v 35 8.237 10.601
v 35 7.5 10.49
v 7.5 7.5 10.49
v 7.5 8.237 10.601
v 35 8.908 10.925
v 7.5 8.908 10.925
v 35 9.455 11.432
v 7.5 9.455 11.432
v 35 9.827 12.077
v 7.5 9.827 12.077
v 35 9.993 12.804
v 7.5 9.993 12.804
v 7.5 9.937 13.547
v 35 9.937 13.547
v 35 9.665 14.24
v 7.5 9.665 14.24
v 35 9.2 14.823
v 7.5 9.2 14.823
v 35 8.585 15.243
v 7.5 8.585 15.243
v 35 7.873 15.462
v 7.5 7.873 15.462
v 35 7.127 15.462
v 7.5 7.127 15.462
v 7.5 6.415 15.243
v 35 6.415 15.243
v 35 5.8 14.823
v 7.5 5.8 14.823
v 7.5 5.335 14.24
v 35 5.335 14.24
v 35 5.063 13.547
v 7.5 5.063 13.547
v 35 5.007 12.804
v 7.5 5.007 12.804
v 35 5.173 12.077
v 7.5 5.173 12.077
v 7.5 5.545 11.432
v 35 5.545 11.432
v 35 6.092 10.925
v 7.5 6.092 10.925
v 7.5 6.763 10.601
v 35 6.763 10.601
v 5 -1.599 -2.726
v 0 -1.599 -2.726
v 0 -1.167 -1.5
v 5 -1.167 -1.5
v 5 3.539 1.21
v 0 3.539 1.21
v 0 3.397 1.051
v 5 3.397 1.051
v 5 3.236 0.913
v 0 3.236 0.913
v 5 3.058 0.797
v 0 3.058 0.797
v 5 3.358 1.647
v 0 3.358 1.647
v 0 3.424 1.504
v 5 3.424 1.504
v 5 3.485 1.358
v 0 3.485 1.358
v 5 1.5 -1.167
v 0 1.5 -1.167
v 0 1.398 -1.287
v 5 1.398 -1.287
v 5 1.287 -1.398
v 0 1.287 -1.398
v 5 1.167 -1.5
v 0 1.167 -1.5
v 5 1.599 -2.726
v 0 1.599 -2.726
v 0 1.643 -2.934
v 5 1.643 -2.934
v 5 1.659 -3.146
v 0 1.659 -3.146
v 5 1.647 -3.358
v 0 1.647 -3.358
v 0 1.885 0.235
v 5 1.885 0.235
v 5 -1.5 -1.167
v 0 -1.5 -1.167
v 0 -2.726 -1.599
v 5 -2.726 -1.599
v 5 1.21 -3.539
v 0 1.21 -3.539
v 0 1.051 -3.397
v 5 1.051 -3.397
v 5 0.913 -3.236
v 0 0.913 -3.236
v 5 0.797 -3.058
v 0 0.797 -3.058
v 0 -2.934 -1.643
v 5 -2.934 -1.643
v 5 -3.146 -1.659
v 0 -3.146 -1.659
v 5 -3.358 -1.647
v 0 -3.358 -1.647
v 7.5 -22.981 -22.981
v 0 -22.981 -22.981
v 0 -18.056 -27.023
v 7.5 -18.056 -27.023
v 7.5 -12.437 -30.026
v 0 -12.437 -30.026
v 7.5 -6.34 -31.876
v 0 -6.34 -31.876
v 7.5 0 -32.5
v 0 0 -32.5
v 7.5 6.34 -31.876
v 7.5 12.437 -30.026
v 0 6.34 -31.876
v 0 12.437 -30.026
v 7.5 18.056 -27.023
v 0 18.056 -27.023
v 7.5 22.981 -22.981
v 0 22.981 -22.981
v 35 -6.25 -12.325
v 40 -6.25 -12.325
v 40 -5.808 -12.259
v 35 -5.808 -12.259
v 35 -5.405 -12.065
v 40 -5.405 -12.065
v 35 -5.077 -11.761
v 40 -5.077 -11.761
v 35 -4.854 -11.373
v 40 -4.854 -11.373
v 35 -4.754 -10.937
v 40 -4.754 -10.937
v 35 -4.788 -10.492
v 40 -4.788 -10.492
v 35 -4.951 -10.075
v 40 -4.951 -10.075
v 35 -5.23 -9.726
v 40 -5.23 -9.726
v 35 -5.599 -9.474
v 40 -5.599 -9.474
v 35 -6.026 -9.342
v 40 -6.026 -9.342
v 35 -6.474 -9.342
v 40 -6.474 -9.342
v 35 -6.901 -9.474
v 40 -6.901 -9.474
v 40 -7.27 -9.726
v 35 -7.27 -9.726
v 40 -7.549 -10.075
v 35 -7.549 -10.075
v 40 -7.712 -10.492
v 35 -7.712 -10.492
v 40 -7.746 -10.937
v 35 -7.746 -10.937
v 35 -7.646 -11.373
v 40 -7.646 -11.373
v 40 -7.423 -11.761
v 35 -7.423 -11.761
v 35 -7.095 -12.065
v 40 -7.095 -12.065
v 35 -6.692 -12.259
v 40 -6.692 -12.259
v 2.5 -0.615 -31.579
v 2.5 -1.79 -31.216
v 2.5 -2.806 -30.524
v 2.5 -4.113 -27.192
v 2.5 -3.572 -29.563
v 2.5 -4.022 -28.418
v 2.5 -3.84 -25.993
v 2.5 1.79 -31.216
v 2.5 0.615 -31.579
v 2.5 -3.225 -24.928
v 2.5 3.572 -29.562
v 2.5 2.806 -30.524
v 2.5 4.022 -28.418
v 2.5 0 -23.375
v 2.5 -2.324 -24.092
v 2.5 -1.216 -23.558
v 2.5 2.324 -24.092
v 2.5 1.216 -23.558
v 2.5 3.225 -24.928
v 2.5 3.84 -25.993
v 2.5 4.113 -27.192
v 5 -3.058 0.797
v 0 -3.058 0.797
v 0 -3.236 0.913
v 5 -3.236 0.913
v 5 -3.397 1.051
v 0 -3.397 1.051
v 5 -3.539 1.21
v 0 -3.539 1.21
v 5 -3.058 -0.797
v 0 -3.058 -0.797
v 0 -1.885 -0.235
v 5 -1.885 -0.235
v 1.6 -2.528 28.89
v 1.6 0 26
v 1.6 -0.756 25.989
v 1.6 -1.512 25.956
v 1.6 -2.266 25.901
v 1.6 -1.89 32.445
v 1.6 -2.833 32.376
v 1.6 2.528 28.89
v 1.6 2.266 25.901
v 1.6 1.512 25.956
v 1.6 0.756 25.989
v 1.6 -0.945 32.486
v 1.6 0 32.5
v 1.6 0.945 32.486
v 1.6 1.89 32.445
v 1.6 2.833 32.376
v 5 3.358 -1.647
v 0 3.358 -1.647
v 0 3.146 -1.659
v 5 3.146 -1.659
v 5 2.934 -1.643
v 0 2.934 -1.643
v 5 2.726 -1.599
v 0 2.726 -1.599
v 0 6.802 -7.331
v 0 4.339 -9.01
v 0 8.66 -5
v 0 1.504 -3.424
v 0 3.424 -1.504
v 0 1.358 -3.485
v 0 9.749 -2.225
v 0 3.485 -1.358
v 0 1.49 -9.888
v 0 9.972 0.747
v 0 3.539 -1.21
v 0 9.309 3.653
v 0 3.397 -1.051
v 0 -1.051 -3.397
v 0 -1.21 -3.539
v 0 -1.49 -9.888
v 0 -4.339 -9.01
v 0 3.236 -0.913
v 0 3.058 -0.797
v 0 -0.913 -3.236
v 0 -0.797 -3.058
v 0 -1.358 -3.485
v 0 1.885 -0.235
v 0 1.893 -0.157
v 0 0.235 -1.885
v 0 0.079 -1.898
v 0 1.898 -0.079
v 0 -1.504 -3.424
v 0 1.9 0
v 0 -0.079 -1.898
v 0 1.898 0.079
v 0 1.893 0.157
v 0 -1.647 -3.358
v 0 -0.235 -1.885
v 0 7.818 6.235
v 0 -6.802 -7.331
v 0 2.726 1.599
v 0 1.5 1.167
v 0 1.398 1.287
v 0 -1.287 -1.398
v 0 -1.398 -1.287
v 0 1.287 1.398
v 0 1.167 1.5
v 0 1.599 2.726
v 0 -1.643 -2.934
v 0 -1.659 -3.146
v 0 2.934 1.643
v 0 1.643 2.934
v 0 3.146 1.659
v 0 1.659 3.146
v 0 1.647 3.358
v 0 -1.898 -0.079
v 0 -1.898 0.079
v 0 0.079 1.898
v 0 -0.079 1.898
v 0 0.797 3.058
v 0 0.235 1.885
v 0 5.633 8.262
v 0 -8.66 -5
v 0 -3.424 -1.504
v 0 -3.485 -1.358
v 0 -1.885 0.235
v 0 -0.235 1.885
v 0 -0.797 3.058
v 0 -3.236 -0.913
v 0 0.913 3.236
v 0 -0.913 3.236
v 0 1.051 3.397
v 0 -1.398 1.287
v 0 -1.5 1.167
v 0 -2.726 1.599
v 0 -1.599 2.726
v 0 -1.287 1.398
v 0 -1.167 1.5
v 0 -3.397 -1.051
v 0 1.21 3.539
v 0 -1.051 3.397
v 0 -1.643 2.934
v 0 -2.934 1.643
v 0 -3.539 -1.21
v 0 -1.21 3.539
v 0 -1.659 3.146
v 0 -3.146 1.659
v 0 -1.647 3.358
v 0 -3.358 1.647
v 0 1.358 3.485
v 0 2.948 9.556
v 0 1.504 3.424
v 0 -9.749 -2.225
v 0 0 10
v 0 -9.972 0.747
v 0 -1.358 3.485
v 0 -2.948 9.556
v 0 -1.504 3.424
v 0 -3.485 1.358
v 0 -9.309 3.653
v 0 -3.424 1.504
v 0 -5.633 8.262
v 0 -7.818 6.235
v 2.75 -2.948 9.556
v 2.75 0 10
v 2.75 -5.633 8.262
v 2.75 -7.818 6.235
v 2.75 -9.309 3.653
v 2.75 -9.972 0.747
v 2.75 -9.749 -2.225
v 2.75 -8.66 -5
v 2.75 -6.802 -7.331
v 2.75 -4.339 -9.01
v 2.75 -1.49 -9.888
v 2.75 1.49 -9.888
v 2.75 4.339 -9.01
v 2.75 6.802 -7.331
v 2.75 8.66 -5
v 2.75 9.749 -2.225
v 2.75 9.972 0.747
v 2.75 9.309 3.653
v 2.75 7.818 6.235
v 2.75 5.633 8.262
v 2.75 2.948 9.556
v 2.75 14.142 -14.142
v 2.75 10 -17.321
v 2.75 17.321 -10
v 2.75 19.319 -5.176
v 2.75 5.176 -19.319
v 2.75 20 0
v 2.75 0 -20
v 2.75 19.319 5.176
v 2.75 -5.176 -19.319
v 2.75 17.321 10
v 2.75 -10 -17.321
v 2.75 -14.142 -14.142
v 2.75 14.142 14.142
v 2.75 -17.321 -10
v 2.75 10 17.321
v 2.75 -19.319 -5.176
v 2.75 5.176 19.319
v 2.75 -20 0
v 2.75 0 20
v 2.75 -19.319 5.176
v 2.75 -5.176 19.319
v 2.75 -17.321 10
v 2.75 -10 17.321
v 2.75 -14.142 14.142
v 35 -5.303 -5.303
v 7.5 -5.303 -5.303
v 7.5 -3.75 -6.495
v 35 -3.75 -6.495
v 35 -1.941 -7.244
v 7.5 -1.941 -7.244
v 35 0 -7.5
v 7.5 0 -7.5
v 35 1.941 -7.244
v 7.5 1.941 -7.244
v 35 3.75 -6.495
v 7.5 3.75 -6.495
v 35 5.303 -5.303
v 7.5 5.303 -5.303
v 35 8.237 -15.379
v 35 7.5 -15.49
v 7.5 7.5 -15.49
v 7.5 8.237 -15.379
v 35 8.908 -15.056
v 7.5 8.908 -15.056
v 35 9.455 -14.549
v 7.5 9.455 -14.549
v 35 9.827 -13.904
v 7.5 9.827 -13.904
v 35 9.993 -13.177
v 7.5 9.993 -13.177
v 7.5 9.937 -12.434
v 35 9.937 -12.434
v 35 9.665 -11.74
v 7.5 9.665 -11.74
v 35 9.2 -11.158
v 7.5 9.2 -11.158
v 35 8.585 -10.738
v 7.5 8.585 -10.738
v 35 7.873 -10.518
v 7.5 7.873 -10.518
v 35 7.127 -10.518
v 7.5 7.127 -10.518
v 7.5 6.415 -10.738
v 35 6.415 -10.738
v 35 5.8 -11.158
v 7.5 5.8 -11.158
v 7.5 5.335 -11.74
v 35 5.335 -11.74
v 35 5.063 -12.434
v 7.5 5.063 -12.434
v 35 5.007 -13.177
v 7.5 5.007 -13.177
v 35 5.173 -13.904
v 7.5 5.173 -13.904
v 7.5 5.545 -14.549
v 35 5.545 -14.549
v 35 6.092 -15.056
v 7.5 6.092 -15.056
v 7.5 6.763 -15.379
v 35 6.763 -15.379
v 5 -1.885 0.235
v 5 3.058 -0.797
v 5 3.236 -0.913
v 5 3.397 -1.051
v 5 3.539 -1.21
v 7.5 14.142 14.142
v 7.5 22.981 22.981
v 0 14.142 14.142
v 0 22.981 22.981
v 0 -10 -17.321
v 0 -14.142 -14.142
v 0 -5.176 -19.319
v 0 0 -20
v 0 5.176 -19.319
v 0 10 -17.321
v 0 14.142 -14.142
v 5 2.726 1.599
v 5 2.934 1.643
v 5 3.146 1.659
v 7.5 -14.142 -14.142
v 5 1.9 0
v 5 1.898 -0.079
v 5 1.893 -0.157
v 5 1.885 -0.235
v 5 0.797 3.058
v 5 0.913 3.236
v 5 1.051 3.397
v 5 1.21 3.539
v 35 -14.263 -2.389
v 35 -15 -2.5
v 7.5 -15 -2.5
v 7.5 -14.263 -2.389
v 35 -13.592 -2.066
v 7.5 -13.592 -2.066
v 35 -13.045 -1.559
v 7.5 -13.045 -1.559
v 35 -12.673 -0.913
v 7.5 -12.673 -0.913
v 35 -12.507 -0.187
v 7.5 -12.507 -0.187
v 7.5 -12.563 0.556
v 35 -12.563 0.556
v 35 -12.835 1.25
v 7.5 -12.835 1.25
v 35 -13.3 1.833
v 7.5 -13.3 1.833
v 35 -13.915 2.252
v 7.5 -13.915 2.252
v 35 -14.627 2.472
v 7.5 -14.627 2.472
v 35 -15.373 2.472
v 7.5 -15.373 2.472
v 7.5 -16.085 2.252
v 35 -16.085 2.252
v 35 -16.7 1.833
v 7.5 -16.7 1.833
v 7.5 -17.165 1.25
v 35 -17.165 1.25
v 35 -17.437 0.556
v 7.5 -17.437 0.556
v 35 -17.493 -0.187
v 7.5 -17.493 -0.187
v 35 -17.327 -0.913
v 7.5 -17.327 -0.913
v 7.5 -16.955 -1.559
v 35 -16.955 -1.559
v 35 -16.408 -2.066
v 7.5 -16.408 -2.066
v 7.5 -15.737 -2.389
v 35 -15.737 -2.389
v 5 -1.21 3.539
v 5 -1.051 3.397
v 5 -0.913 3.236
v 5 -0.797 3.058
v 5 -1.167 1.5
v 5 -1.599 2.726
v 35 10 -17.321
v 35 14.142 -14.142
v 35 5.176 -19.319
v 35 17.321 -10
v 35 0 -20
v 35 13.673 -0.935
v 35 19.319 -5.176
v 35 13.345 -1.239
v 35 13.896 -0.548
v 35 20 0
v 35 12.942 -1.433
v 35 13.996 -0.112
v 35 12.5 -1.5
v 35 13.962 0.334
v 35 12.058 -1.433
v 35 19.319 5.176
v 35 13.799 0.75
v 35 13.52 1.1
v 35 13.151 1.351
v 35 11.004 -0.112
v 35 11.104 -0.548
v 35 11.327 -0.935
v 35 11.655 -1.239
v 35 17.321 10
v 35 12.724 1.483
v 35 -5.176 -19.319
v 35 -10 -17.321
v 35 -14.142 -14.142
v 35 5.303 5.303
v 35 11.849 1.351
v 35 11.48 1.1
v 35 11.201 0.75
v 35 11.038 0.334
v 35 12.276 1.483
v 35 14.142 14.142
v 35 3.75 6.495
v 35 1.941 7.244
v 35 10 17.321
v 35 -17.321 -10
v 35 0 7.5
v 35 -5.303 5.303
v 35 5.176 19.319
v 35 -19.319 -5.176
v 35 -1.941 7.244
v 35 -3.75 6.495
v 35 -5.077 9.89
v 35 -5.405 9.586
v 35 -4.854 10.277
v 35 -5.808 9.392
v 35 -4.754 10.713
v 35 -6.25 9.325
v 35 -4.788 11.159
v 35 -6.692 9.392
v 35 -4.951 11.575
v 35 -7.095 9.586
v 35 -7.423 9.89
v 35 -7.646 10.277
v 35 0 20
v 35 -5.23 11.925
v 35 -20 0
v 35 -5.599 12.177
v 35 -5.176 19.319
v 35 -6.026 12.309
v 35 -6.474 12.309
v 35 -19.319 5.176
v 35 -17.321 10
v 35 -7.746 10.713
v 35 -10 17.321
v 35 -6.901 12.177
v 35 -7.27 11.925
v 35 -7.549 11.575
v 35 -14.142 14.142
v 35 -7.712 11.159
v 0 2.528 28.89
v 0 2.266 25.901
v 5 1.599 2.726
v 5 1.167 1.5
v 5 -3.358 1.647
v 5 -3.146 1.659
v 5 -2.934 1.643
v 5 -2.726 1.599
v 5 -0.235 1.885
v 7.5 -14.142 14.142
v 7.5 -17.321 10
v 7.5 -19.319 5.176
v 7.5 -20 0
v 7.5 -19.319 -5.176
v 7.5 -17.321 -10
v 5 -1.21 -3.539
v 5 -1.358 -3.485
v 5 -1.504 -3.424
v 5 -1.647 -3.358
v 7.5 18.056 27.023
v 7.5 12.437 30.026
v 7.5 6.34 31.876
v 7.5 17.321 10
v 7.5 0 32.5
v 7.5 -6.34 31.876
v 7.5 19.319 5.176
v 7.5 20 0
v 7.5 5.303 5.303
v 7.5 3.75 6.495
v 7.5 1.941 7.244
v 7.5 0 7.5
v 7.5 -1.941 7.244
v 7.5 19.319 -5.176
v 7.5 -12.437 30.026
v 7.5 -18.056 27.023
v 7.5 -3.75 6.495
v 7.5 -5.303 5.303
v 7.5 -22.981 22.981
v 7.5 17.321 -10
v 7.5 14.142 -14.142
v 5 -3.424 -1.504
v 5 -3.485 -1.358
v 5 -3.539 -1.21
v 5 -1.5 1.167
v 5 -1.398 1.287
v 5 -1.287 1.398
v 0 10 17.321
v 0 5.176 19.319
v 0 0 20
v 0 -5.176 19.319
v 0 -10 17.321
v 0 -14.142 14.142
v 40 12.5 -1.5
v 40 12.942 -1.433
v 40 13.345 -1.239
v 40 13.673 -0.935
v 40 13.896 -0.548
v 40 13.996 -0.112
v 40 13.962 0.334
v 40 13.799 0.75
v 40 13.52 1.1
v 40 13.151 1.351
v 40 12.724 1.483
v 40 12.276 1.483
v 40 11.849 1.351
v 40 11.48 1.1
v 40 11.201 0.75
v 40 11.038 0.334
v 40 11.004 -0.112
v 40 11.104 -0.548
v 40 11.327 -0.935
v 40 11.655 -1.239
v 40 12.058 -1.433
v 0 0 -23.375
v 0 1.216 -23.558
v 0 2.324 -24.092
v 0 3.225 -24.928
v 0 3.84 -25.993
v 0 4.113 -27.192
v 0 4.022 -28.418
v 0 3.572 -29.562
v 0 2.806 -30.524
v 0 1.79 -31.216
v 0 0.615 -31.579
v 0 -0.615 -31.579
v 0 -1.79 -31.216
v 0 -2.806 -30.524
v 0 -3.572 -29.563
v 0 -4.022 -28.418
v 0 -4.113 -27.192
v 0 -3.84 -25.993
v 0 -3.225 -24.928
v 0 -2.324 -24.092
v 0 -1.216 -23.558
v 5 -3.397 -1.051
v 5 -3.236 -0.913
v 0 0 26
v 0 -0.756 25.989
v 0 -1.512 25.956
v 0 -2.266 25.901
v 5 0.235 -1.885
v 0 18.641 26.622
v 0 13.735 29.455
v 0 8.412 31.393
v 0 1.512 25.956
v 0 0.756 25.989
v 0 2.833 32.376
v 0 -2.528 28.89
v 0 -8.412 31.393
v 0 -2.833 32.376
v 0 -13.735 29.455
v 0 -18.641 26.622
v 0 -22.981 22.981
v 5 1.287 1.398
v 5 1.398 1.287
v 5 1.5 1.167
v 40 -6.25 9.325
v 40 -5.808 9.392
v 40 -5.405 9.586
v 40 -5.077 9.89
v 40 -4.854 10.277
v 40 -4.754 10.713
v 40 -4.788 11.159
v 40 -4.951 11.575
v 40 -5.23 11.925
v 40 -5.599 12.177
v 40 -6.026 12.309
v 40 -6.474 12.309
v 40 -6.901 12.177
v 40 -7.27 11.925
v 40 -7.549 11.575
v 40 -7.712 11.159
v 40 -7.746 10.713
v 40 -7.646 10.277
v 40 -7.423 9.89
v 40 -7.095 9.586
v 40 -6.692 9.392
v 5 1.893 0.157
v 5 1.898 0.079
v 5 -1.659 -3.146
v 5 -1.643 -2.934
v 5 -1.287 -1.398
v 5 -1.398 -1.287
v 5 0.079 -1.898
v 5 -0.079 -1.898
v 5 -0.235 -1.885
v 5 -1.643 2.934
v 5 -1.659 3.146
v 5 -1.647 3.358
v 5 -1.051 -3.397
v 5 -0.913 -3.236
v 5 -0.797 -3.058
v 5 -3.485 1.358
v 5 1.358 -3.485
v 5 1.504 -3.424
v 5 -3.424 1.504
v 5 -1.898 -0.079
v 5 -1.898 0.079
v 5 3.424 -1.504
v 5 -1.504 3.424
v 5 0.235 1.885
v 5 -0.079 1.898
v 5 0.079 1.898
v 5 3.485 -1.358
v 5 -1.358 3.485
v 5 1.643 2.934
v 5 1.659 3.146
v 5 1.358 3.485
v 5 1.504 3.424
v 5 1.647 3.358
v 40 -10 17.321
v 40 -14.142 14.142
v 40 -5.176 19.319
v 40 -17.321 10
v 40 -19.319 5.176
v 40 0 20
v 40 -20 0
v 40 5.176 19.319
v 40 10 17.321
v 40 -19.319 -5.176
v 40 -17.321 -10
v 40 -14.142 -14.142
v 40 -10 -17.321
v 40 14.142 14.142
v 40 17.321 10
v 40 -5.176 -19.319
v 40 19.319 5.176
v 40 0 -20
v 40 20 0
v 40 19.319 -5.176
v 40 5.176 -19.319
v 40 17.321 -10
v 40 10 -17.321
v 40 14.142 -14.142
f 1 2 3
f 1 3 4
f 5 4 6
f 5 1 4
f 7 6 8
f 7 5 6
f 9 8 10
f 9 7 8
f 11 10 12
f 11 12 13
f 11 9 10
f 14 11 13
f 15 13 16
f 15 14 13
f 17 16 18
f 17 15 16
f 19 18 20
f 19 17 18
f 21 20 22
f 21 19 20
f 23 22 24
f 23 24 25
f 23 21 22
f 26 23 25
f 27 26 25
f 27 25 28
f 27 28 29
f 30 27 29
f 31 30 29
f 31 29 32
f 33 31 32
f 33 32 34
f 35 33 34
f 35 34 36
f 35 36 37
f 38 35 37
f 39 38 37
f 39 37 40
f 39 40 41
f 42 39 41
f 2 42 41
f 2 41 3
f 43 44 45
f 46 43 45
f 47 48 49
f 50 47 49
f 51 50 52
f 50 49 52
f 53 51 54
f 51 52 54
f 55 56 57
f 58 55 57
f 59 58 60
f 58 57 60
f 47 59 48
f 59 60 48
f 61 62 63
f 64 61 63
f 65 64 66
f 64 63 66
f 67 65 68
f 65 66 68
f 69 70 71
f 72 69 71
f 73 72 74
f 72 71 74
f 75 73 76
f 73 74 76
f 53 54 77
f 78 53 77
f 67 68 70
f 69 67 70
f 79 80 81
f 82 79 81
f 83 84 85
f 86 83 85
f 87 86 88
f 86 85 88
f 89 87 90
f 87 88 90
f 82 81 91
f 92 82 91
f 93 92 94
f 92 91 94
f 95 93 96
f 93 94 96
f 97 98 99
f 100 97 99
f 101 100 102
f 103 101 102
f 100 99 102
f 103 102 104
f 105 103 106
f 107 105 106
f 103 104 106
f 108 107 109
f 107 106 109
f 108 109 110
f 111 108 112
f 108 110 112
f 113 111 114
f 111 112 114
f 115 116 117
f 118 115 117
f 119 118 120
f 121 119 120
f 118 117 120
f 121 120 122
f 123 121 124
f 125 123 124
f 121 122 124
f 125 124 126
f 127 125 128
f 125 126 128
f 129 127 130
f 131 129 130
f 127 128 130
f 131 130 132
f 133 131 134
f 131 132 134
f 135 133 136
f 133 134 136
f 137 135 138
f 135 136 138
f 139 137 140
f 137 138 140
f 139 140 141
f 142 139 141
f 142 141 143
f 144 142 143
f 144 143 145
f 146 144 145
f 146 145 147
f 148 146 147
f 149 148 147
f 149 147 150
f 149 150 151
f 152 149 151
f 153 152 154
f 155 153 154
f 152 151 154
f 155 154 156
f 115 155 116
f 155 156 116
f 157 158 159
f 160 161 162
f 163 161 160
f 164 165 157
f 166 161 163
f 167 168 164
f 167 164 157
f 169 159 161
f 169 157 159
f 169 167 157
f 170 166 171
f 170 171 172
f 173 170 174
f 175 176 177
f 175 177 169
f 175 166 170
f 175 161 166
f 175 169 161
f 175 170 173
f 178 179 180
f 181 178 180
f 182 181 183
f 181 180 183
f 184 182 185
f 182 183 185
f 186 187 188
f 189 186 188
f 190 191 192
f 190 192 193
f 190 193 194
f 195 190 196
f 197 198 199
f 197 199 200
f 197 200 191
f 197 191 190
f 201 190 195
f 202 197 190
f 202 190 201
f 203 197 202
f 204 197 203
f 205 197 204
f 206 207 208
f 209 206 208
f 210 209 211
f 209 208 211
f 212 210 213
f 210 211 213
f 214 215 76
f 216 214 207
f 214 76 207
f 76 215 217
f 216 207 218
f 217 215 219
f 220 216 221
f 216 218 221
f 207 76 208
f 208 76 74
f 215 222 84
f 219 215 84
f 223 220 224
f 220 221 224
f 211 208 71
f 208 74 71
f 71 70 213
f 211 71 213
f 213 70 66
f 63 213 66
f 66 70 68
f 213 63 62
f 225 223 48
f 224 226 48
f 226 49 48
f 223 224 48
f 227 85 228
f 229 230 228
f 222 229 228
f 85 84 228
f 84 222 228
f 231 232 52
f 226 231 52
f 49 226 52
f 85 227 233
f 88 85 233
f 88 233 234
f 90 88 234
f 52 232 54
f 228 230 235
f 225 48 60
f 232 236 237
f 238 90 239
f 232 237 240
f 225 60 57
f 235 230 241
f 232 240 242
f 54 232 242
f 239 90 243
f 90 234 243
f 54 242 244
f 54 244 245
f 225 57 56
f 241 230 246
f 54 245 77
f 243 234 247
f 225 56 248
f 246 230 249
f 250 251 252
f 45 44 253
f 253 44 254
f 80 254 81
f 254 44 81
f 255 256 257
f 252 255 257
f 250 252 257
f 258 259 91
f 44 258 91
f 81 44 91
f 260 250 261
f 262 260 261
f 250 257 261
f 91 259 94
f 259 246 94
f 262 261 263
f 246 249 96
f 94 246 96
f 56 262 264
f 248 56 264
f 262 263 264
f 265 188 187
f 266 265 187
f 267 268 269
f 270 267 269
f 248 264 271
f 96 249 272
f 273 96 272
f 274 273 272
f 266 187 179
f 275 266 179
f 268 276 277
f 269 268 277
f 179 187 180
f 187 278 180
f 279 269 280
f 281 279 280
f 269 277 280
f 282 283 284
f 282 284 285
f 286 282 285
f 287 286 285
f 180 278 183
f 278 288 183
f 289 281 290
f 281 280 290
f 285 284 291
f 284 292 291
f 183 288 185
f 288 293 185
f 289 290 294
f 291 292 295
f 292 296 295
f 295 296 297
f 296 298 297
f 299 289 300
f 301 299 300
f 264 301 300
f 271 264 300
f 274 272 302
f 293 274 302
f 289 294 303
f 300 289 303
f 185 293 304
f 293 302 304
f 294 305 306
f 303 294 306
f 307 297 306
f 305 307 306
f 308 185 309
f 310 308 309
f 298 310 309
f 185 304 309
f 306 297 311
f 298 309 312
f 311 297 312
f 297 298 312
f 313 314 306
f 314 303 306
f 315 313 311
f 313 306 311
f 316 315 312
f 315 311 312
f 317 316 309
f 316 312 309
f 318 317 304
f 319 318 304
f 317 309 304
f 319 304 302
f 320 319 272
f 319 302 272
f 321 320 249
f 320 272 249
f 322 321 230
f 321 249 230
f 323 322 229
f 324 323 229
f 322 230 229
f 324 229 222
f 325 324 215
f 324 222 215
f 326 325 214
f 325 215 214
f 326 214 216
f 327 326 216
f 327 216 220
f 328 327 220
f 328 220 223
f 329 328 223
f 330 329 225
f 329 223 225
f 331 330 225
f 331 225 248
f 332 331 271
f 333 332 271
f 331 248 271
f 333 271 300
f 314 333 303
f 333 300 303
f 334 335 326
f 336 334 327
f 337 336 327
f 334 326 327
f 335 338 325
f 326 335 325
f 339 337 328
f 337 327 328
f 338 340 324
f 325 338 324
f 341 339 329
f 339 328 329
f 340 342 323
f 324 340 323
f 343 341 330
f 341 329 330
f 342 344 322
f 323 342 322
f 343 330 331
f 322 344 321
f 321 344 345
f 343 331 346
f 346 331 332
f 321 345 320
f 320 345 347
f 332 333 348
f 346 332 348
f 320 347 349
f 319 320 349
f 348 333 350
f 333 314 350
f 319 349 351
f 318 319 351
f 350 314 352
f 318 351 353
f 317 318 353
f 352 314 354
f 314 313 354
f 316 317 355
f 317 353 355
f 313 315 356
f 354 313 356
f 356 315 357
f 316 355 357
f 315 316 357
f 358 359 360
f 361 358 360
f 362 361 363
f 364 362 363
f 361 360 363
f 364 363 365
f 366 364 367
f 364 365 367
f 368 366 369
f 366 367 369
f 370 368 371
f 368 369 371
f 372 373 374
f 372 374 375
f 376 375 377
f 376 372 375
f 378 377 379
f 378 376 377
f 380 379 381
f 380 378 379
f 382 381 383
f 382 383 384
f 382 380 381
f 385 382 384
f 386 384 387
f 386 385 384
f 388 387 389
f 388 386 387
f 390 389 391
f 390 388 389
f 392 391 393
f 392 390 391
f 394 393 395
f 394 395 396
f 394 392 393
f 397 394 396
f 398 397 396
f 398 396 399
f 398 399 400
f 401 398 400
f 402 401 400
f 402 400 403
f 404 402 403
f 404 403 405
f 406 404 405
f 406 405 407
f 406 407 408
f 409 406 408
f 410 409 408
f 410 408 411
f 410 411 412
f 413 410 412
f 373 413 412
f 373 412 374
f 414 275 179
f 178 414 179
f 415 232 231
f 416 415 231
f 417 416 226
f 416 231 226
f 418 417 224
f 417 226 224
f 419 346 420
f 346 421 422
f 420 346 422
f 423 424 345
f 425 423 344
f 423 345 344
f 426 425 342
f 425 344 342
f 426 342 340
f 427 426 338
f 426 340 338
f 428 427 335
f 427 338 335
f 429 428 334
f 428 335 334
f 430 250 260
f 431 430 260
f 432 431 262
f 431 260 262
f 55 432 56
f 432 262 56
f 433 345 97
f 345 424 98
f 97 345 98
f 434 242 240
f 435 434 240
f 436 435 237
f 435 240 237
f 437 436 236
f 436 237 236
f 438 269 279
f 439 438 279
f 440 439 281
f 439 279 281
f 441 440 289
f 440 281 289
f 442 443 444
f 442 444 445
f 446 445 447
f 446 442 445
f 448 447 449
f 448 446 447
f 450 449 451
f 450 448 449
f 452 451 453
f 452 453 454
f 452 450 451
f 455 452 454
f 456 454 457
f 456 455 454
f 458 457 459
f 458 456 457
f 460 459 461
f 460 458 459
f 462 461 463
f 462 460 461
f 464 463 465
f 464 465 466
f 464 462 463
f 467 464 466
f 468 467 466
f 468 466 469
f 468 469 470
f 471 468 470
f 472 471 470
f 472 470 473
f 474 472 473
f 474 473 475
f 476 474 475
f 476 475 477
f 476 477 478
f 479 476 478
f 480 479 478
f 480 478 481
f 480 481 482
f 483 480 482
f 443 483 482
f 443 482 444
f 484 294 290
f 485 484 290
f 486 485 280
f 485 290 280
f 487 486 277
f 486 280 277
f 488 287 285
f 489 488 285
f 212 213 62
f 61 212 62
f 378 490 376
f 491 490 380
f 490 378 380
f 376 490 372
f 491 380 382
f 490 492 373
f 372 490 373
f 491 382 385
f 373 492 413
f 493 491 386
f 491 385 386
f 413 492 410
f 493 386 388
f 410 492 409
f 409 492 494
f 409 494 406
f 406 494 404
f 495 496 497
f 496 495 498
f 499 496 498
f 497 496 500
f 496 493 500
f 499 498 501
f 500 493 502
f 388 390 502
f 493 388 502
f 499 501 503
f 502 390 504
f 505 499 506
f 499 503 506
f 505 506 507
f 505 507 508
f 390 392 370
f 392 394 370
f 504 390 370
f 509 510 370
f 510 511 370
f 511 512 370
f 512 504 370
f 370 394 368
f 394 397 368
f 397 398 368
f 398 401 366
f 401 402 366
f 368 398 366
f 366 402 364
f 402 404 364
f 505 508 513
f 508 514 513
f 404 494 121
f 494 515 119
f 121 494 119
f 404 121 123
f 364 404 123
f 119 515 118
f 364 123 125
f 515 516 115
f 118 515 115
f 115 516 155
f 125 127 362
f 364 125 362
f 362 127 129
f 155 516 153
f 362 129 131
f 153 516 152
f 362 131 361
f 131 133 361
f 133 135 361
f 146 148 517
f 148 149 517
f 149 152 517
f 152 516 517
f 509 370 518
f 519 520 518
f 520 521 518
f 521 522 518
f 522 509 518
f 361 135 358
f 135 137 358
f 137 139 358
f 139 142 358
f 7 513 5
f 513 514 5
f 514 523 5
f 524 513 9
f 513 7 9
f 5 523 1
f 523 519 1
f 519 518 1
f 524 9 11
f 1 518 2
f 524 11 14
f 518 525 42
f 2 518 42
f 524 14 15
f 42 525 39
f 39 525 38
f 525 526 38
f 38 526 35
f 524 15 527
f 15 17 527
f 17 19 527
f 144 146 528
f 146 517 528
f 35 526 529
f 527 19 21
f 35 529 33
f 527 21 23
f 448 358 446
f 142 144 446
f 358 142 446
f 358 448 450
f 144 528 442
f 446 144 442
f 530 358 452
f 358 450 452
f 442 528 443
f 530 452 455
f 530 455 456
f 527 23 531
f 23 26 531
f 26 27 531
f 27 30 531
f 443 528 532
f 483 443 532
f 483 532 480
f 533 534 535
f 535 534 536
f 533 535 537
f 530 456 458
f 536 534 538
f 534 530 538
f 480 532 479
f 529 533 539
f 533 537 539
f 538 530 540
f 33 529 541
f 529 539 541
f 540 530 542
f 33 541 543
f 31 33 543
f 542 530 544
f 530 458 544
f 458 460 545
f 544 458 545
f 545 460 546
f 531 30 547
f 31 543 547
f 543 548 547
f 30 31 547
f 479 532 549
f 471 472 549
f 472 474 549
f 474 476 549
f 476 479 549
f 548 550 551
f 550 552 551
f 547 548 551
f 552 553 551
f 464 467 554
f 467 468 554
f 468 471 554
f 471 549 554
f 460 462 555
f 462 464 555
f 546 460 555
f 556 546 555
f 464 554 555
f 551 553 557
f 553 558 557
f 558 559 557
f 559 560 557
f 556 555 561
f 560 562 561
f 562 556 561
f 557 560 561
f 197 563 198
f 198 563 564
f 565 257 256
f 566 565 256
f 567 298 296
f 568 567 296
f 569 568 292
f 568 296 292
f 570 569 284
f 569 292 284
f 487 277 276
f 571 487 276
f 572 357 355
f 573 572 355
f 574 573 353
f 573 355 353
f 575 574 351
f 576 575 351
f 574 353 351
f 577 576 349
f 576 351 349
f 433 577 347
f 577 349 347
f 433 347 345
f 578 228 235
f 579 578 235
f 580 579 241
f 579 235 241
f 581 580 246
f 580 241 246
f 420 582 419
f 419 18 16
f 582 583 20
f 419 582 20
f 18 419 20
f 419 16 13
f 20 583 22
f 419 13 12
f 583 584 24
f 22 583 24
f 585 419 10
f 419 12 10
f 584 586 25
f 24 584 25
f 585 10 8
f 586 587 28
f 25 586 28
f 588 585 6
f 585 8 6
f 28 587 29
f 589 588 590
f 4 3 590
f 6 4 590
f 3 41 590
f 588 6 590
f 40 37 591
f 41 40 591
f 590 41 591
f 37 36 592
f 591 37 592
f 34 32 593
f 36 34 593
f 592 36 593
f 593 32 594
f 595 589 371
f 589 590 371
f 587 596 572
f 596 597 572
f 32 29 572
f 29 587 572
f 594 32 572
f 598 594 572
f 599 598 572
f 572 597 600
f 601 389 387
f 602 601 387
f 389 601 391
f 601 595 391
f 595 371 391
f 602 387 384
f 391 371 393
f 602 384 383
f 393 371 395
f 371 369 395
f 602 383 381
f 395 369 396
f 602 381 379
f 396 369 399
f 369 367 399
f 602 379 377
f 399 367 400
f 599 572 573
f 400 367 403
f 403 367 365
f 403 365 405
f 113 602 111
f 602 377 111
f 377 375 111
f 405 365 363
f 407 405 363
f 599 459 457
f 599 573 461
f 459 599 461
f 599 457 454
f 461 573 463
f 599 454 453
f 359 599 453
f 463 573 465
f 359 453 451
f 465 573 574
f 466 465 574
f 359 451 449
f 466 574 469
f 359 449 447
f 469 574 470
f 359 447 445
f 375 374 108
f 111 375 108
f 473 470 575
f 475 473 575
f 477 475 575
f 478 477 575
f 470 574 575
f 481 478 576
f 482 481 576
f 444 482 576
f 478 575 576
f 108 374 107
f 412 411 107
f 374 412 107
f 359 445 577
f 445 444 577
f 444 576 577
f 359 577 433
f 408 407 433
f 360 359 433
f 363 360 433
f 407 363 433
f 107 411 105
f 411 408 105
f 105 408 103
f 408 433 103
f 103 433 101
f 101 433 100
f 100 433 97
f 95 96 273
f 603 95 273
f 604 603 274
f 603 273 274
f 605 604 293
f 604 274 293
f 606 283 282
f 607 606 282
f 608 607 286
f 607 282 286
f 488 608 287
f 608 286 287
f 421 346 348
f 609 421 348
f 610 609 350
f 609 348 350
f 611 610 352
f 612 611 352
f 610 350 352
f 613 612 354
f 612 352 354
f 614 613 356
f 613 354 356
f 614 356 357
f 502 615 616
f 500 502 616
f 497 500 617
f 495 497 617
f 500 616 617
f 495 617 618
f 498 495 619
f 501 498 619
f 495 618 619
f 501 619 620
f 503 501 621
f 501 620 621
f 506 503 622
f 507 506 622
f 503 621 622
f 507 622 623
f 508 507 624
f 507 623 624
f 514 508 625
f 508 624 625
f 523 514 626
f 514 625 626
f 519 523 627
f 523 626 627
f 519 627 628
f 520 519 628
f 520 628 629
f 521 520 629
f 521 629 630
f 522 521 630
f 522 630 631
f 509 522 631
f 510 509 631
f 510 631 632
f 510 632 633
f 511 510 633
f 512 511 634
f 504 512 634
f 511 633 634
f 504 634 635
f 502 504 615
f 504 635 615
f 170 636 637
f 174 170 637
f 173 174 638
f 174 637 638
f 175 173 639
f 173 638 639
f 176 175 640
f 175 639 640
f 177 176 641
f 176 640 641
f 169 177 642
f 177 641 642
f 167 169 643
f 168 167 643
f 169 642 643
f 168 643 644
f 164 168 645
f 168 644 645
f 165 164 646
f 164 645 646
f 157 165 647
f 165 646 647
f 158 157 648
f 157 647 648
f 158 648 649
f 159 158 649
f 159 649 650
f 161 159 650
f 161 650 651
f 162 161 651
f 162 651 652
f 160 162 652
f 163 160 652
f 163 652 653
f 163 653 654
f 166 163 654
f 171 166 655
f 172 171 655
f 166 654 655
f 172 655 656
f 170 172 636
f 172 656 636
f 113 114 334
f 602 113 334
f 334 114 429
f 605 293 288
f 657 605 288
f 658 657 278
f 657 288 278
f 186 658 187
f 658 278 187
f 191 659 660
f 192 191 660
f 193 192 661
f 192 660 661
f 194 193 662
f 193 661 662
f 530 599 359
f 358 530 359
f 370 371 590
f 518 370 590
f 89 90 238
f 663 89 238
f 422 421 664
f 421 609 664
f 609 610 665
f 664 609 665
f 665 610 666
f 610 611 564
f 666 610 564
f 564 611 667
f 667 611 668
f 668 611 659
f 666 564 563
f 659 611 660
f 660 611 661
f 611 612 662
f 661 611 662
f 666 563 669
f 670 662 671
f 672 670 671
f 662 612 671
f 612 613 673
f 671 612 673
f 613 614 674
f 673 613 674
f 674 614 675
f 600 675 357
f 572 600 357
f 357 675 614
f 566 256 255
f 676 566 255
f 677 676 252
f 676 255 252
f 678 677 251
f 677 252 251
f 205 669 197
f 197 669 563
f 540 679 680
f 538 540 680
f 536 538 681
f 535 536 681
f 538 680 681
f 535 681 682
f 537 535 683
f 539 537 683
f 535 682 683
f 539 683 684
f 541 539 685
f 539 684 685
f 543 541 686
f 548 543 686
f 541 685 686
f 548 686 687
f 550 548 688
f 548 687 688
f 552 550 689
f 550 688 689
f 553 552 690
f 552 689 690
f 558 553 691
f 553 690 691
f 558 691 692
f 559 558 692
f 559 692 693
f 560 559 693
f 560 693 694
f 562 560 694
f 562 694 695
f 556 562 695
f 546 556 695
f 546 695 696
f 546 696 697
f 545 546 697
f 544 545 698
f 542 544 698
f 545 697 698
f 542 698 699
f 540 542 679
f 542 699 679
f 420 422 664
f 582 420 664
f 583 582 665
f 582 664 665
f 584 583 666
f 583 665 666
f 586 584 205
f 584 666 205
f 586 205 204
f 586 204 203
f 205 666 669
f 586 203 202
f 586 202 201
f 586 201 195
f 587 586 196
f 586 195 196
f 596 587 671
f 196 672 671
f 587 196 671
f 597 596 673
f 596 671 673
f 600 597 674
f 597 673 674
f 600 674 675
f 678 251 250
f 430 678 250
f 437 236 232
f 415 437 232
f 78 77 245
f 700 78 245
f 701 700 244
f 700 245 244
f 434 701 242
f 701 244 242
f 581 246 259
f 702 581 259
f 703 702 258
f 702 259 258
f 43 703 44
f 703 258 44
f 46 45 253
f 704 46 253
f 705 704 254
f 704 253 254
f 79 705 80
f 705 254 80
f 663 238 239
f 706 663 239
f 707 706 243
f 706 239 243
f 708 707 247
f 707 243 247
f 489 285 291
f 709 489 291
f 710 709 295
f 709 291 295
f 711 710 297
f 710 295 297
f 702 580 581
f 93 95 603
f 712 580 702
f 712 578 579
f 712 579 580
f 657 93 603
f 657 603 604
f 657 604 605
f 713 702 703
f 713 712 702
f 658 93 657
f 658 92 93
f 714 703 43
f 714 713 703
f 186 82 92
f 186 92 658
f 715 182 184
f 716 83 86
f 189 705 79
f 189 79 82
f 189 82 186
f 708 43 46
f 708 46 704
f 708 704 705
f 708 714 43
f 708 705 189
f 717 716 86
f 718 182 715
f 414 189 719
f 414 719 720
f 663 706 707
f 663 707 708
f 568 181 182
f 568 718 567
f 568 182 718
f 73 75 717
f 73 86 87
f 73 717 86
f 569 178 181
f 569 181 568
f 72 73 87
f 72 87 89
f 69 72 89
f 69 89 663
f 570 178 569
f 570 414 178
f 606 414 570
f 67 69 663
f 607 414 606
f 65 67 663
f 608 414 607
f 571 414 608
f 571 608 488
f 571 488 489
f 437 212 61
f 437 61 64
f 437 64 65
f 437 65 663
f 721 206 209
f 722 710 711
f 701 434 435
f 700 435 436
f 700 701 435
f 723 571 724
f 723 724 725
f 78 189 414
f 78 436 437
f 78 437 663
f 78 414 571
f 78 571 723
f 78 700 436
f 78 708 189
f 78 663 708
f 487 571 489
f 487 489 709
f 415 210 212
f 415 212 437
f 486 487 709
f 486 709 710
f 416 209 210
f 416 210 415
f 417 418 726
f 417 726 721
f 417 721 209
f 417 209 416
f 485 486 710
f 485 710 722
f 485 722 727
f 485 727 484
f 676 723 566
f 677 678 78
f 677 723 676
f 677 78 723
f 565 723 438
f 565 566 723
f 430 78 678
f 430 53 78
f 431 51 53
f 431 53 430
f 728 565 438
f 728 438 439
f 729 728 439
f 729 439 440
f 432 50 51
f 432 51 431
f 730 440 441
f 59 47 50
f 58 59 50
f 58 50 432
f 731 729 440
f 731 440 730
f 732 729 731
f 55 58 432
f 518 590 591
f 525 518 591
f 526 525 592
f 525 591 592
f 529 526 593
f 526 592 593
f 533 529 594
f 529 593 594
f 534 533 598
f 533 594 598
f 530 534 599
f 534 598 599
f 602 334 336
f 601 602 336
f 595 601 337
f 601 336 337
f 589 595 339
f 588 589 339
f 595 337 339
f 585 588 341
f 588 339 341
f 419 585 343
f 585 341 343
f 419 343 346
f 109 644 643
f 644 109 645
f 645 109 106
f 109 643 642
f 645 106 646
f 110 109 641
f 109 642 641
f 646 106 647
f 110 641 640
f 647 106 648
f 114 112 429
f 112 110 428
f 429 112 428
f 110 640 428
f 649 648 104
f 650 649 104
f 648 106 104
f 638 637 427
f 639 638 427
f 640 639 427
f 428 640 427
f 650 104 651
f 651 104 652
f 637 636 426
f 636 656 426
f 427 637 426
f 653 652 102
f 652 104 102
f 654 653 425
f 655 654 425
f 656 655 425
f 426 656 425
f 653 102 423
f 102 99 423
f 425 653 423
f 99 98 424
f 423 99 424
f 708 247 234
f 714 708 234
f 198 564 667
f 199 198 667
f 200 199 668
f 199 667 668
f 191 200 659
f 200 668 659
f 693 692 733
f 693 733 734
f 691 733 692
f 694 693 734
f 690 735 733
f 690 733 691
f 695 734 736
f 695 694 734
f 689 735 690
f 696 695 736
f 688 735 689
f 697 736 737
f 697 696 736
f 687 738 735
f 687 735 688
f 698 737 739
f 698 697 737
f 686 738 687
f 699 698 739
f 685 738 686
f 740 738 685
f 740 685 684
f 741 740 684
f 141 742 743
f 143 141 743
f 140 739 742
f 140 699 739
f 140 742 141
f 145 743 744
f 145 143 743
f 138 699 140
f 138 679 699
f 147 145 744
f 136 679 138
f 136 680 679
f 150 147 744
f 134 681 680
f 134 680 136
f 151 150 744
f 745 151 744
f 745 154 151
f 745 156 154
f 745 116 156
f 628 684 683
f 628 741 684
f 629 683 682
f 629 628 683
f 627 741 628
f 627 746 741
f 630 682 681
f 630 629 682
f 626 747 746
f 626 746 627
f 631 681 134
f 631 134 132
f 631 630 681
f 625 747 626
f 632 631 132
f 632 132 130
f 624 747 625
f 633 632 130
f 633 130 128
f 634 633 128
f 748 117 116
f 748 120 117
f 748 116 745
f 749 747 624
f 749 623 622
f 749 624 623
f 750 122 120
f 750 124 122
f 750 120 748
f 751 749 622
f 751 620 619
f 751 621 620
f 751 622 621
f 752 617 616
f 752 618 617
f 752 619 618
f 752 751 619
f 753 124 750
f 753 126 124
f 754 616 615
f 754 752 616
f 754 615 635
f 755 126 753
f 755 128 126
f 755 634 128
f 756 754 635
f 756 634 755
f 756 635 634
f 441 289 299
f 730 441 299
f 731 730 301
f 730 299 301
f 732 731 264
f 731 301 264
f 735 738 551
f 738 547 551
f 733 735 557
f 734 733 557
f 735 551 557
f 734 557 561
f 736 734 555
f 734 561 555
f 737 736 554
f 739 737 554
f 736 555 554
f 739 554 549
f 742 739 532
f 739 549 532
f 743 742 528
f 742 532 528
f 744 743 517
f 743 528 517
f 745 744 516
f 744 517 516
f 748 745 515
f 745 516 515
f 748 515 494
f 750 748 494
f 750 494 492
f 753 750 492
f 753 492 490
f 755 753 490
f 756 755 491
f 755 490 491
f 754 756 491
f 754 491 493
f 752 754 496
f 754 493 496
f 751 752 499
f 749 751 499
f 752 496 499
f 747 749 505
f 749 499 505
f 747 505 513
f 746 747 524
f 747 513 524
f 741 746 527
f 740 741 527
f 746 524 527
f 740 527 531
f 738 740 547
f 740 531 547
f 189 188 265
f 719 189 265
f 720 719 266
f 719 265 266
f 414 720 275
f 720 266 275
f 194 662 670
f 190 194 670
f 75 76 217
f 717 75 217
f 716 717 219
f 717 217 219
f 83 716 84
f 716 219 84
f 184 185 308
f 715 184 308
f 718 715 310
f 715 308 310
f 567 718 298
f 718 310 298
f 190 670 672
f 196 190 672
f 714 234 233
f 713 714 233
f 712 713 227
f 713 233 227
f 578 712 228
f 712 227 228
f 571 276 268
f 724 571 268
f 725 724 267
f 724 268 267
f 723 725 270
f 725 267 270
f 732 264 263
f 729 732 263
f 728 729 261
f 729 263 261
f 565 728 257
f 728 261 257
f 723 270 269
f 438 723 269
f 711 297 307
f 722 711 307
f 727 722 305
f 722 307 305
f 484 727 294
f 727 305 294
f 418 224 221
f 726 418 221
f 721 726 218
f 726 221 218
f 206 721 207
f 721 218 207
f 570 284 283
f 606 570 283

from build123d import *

# Parameters (mm, degrees)
CORTAR_EXTRUIR2_DEPTH   = 7.5
CROQUIS5_R              = 1.5
CORTAR_EXTRUIR4_DEPTH   = 5
CROQUIS6_R              = 2.5
SALIENTE_EXTRUIR1_DEPTH = 32.5
CORTAR_EXTRUIR5_DEPTH   = 5
CORTAR_EXTRUIR12_DEPTH  = 2.5
CORTAR_EXTRUIR13_START  = 27.5
CORTAR_EXTRUIR13_DEPTH  = 27.5
CORTAR_EXTRUIR14_DEPTH  = 1.6


with BuildPart() as part:
    # Croquis1 → Revolución1 (revolve)
    with BuildSketch(Plane(origin=(0, 0, 0), x_dir=(1, 0, 0), z_dir=(0, 1, 0)), mode=Mode.PRIVATE) as revoluci_n1_sk:
        Polygon((0, 0), (40, 0), (40, 20), (35, 20), (35, 7.5), (7.5, 7.5), (7.5, 32.5), (0, 32.5), (0, 20), (2.75, 20), (2.75, 10), (0, 10), align=None)
    revolve(revoluci_n1_sk.sketch.rotate(Axis((0, 0, 0), (1, 0, 0)), 180), axis=Axis((0, 0, 0), (1, 0, 0)))

    # Croquis2 → Cortar-Extruir2 (cut)
    with BuildSketch(Plane.ZY):
        with BuildLine():
            ThreePointArc((-14.142135624, 14.142135624), (0, 20), (14.142135624, 14.142135624))
            Line((14.142135624, 14.142135624), (22.980970389, 22.980970389))
            ThreePointArc((22.980970389, 22.980970389), (0, 32.5), (-22.980970389, 22.980970389))
            Line((-22.980970389, 22.980970389), (-14.142135624, 14.142135624))
        make_face()
        with BuildLine():
            Line((22.980970389, -22.980970389), (14.142135624, -14.142135624))
            ThreePointArc((14.142135624, -14.142135624), (0, -20), (-14.142135624, -14.142135624))
            Line((-14.142135624, -14.142135624), (-22.980970389, -22.980970389))
            ThreePointArc((-22.980970389, -22.980970389), (0, -32.5), (22.980970389, -22.980970389))
        make_face()
    extrude(amount=-CORTAR_EXTRUIR2_DEPTH, mode=Mode.SUBTRACT)

    # Croquis5 → Cortar-Extruir4 (cut)
    with BuildSketch(Plane(origin=(40, 0, 0), x_dir=(0, 0, -1), z_dir=(1, 0, 0))):
        with Locations((0, 12.5)):
            Circle(CROQUIS5_R)
        with Locations((10.825317547, -6.25)):
            Circle(CROQUIS5_R)
        with Locations((-10.825317547, -6.25)):
            Circle(CROQUIS5_R)
    extrude(amount=-CORTAR_EXTRUIR4_DEPTH, mode=Mode.SUBTRACT)

    # Croquis6 → Saliente-Extruir1 (add)
    with BuildSketch(Plane(origin=(40, 0, 0), x_dir=(0, 0, -1), z_dir=(1, 0, 0))):
        with Locations((0, -15)):
            Circle(CROQUIS6_R)
        with Locations((-12.990381057, 7.5)):
            Circle(CROQUIS6_R)
        with Locations((12.990381057, 7.5)):
            Circle(CROQUIS6_R)
    extrude(amount=-SALIENTE_EXTRUIR1_DEPTH)

    # Croquis7 → Cortar-Extruir5 (cut)
    with BuildSketch(Plane.ZY):
        with BuildLine():
            Line((-0.23528257, 1.885375854), (-0.796607872, 3.057943083))
            ThreePointArc((-0.796607872, 3.057943083), (-0.979134174, 3.319175723), (-1.21, 3.538855747))
            ThreePointArc((-1.21, 3.538855747), (-1.431236037, 3.455309452), (-1.646749691, 3.357948102))
            ThreePointArc((-1.646749691, 3.357948102), (-1.654659248, 3.039364075), (-1.599005463, 2.725579118))
            Line((-1.599005463, 2.725579118), (-1.166792151, 1.499531952))
            ThreePointArc((-1.166792151, 1.499531952), (-1.343502884, 1.343502884), (-1.499531952, 1.166792151))
            Line((-1.499531952, 1.166792151), (-2.725579118, 1.599005463))
            ThreePointArc((-2.725579118, 1.599005463), (-3.039364075, 1.654659248), (-3.357948102, 1.646749691))
            ThreePointArc((-3.357948102, 1.646749691), (-3.455309452, 1.431236037), (-3.538855747, 1.21))
            ThreePointArc((-3.538855747, 1.21), (-3.319175723, 0.979134174), (-3.057943083, 0.796607872))
            Line((-3.057943083, 0.796607872), (-1.885375854, 0.23528257))
            ThreePointArc((-1.885375854, 0.23528257), (-1.9, 0), (-1.885375854, -0.23528257))
            Line((-1.885375854, -0.23528257), (-3.057943083, -0.796607872))
            ThreePointArc((-3.057943083, -0.796607872), (-3.319175723, -0.979134174), (-3.538855747, -1.21))
            ThreePointArc((-3.538855747, -1.21), (-3.455309452, -1.431236037), (-3.357948102, -1.646749691))
            ThreePointArc((-3.357948102, -1.646749691), (-3.039364075, -1.654659248), (-2.725579118, -1.599005463))
            Line((-2.725579118, -1.599005463), (-1.499531952, -1.166792151))
            ThreePointArc((-1.499531952, -1.166792151), (-1.343502884, -1.343502884), (-1.166792151, -1.499531952))
            Line((-1.166792151, -1.499531952), (-1.599005463, -2.725579118))
            ThreePointArc((-1.599005463, -2.725579118), (-1.654659248, -3.039364075), (-1.646749691, -3.357948102))
            ThreePointArc((-1.646749691, -3.357948102), (-1.431236037, -3.455309452), (-1.21, -3.538855747))
            ThreePointArc((-1.21, -3.538855747), (-0.979134174, -3.319175723), (-0.796607872, -3.057943083))
            Line((-0.796607872, -3.057943083), (-0.23528257, -1.885375854))
            ThreePointArc((-0.23528257, -1.885375854), (0, -1.9), (0.23528257, -1.885375854))
            Line((0.23528257, -1.885375854), (0.796607872, -3.057943083))
            ThreePointArc((0.796607872, -3.057943083), (0.979134174, -3.319175723), (1.21, -3.538855747))
            ThreePointArc((1.21, -3.538855747), (1.431236037, -3.455309452), (1.646749691, -3.357948102))
            ThreePointArc((1.646749691, -3.357948102), (1.654659248, -3.039364075), (1.599005463, -2.725579118))
            Line((1.599005463, -2.725579118), (1.166792151, -1.499531952))
            ThreePointArc((1.166792151, -1.499531952), (1.343502884, -1.343502884), (1.499531952, -1.166792151))
            Line((1.499531952, -1.166792151), (2.725579118, -1.599005463))
            ThreePointArc((2.725579118, -1.599005463), (3.039364075, -1.654659248), (3.357948102, -1.646749691))
            ThreePointArc((3.357948102, -1.646749691), (3.455309452, -1.431236037), (3.538855747, -1.21))
            ThreePointArc((3.538855747, -1.21), (3.319175723, -0.979134174), (3.057943083, -0.796607872))
            Line((3.057943083, -0.796607872), (1.885375854, -0.23528257))
            ThreePointArc((1.885375854, -0.23528257), (1.9, 0), (1.885375854, 0.23528257))
            Line((1.885375854, 0.23528257), (3.057943083, 0.796607872))
            ThreePointArc((3.057943083, 0.796607872), (3.319175723, 0.979134174), (3.538855747, 1.21))
            ThreePointArc((3.538855747, 1.21), (3.455309452, 1.431236037), (3.357948102, 1.646749691))
            ThreePointArc((3.357948102, 1.646749691), (3.039364075, 1.654659248), (2.725579118, 1.599005463))
            Line((2.725579118, 1.599005463), (1.499531952, 1.166792151))
            ThreePointArc((1.499531952, 1.166792151), (1.343502884, 1.343502884), (1.166792151, 1.499531952))
            Line((1.166792151, 1.499531952), (1.599005463, 2.725579118))
            ThreePointArc((1.599005463, 2.725579118), (1.654659248, 3.039364075), (1.646749691, 3.357948102))
            ThreePointArc((1.646749691, 3.357948102), (1.431236037, 3.455309452), (1.21, 3.538855747))
            ThreePointArc((1.21, 3.538855747), (0.979134174, 3.319175723), (0.796607872, 3.057943083))
            Line((0.796607872, 3.057943083), (0.23528257, 1.885375854))
            ThreePointArc((0.23528257, 1.885375854), (0.117868309, 1.896340439), (0, 1.9))
            ThreePointArc((0, 1.9), (-0.117868309, 1.896340439), (-0.23528257, 1.885375854))
        make_face()
    extrude(amount=-CORTAR_EXTRUIR5_DEPTH, mode=Mode.SUBTRACT)

    # Croquis13 → Cortar-Extruir12 (cut)
    with BuildSketch(Plane.ZY):
        with BuildLine():
            ThreePointArc((-31.625, 0), (-27.5, -4.125), (-23.375, 0))
            Line((-23.375, 0), (-31.625, 0))
        make_face()
        with BuildLine():
            Line((-31.625, 0), (-23.375, 0))
            ThreePointArc((-23.375, 0), (-27.5, 4.125), (-31.625, 0))
        make_face()
    extrude(amount=-CORTAR_EXTRUIR12_DEPTH, mode=Mode.SUBTRACT)

    # Croquis14 → Cortar-Extruir13 (cut)
    with BuildSketch(Plane.ZY.offset(-35).offset(CORTAR_EXTRUIR13_START)):
        with BuildLine():
            Line((-5.303300859, 5.303300859), (0, 5.303300859))
            Line((0, 5.303300859), (0, 7.5))
            ThreePointArc((0, 7.5), (-2.870125743, 6.929096494), (-5.303300859, 5.303300859))
        make_face()
        with BuildLine():
            Line((0, 7.5), (0, 5.303300859))
            Line((0, 5.303300859), (5.303300859, 5.303300859))
            ThreePointArc((5.303300859, 5.303300859), (2.870125743, 6.929096494), (0, 7.5))
        make_face()
        with BuildLine():
            Line((5.303300859, -5.303300859), (-5.303300859, -5.303300859))
            ThreePointArc((-5.303300859, -5.303300859), (0, -7.5), (5.303300859, -5.303300859))
        make_face()
    extrude(amount=-CORTAR_EXTRUIR13_DEPTH, mode=Mode.SUBTRACT)

    # Croquis15 → Cortar-Extruir14 (cut)
    with BuildSketch(Plane.ZY):
        with BuildLine():
            ThreePointArc((29, 0), (28.972398426, -1.264962234), (28.889646245, -2.52751654))
            Line((28.889646245, -2.52751654), (32.376327688, -2.832561639))
            ThreePointArc((32.376327688, -2.832561639), (32.469067201, -1.417630089), (32.5, 0))
            ThreePointArc((32.5, 0), (32.469067201, 1.417630089), (32.376327688, 2.832561639))
            Line((32.376327688, 2.832561639), (28.889646245, 2.52751654))
            ThreePointArc((28.889646245, 2.52751654), (28.972398426, 1.264962234), (29, 0))
        make_face()
        with BuildLine():
            ThreePointArc((26, 0), (25.975253761, -1.134104071), (25.90106215, -2.266049311))
            Line((25.90106215, -2.266049311), (28.889646245, -2.52751654))
            ThreePointArc((28.889646245, -2.52751654), (28.972398426, -1.264962234), (29, 0))
            ThreePointArc((29, 0), (28.972398426, 1.264962234), (28.889646245, 2.52751654))
            Line((28.889646245, 2.52751654), (25.90106215, 2.266049311))
            ThreePointArc((25.90106215, 2.266049311), (25.975253761, 1.134104071), (26, 0))
        make_face()
    extrude(amount=-CORTAR_EXTRUIR14_DEPTH, mode=Mode.SUBTRACT)


solid = part.part
